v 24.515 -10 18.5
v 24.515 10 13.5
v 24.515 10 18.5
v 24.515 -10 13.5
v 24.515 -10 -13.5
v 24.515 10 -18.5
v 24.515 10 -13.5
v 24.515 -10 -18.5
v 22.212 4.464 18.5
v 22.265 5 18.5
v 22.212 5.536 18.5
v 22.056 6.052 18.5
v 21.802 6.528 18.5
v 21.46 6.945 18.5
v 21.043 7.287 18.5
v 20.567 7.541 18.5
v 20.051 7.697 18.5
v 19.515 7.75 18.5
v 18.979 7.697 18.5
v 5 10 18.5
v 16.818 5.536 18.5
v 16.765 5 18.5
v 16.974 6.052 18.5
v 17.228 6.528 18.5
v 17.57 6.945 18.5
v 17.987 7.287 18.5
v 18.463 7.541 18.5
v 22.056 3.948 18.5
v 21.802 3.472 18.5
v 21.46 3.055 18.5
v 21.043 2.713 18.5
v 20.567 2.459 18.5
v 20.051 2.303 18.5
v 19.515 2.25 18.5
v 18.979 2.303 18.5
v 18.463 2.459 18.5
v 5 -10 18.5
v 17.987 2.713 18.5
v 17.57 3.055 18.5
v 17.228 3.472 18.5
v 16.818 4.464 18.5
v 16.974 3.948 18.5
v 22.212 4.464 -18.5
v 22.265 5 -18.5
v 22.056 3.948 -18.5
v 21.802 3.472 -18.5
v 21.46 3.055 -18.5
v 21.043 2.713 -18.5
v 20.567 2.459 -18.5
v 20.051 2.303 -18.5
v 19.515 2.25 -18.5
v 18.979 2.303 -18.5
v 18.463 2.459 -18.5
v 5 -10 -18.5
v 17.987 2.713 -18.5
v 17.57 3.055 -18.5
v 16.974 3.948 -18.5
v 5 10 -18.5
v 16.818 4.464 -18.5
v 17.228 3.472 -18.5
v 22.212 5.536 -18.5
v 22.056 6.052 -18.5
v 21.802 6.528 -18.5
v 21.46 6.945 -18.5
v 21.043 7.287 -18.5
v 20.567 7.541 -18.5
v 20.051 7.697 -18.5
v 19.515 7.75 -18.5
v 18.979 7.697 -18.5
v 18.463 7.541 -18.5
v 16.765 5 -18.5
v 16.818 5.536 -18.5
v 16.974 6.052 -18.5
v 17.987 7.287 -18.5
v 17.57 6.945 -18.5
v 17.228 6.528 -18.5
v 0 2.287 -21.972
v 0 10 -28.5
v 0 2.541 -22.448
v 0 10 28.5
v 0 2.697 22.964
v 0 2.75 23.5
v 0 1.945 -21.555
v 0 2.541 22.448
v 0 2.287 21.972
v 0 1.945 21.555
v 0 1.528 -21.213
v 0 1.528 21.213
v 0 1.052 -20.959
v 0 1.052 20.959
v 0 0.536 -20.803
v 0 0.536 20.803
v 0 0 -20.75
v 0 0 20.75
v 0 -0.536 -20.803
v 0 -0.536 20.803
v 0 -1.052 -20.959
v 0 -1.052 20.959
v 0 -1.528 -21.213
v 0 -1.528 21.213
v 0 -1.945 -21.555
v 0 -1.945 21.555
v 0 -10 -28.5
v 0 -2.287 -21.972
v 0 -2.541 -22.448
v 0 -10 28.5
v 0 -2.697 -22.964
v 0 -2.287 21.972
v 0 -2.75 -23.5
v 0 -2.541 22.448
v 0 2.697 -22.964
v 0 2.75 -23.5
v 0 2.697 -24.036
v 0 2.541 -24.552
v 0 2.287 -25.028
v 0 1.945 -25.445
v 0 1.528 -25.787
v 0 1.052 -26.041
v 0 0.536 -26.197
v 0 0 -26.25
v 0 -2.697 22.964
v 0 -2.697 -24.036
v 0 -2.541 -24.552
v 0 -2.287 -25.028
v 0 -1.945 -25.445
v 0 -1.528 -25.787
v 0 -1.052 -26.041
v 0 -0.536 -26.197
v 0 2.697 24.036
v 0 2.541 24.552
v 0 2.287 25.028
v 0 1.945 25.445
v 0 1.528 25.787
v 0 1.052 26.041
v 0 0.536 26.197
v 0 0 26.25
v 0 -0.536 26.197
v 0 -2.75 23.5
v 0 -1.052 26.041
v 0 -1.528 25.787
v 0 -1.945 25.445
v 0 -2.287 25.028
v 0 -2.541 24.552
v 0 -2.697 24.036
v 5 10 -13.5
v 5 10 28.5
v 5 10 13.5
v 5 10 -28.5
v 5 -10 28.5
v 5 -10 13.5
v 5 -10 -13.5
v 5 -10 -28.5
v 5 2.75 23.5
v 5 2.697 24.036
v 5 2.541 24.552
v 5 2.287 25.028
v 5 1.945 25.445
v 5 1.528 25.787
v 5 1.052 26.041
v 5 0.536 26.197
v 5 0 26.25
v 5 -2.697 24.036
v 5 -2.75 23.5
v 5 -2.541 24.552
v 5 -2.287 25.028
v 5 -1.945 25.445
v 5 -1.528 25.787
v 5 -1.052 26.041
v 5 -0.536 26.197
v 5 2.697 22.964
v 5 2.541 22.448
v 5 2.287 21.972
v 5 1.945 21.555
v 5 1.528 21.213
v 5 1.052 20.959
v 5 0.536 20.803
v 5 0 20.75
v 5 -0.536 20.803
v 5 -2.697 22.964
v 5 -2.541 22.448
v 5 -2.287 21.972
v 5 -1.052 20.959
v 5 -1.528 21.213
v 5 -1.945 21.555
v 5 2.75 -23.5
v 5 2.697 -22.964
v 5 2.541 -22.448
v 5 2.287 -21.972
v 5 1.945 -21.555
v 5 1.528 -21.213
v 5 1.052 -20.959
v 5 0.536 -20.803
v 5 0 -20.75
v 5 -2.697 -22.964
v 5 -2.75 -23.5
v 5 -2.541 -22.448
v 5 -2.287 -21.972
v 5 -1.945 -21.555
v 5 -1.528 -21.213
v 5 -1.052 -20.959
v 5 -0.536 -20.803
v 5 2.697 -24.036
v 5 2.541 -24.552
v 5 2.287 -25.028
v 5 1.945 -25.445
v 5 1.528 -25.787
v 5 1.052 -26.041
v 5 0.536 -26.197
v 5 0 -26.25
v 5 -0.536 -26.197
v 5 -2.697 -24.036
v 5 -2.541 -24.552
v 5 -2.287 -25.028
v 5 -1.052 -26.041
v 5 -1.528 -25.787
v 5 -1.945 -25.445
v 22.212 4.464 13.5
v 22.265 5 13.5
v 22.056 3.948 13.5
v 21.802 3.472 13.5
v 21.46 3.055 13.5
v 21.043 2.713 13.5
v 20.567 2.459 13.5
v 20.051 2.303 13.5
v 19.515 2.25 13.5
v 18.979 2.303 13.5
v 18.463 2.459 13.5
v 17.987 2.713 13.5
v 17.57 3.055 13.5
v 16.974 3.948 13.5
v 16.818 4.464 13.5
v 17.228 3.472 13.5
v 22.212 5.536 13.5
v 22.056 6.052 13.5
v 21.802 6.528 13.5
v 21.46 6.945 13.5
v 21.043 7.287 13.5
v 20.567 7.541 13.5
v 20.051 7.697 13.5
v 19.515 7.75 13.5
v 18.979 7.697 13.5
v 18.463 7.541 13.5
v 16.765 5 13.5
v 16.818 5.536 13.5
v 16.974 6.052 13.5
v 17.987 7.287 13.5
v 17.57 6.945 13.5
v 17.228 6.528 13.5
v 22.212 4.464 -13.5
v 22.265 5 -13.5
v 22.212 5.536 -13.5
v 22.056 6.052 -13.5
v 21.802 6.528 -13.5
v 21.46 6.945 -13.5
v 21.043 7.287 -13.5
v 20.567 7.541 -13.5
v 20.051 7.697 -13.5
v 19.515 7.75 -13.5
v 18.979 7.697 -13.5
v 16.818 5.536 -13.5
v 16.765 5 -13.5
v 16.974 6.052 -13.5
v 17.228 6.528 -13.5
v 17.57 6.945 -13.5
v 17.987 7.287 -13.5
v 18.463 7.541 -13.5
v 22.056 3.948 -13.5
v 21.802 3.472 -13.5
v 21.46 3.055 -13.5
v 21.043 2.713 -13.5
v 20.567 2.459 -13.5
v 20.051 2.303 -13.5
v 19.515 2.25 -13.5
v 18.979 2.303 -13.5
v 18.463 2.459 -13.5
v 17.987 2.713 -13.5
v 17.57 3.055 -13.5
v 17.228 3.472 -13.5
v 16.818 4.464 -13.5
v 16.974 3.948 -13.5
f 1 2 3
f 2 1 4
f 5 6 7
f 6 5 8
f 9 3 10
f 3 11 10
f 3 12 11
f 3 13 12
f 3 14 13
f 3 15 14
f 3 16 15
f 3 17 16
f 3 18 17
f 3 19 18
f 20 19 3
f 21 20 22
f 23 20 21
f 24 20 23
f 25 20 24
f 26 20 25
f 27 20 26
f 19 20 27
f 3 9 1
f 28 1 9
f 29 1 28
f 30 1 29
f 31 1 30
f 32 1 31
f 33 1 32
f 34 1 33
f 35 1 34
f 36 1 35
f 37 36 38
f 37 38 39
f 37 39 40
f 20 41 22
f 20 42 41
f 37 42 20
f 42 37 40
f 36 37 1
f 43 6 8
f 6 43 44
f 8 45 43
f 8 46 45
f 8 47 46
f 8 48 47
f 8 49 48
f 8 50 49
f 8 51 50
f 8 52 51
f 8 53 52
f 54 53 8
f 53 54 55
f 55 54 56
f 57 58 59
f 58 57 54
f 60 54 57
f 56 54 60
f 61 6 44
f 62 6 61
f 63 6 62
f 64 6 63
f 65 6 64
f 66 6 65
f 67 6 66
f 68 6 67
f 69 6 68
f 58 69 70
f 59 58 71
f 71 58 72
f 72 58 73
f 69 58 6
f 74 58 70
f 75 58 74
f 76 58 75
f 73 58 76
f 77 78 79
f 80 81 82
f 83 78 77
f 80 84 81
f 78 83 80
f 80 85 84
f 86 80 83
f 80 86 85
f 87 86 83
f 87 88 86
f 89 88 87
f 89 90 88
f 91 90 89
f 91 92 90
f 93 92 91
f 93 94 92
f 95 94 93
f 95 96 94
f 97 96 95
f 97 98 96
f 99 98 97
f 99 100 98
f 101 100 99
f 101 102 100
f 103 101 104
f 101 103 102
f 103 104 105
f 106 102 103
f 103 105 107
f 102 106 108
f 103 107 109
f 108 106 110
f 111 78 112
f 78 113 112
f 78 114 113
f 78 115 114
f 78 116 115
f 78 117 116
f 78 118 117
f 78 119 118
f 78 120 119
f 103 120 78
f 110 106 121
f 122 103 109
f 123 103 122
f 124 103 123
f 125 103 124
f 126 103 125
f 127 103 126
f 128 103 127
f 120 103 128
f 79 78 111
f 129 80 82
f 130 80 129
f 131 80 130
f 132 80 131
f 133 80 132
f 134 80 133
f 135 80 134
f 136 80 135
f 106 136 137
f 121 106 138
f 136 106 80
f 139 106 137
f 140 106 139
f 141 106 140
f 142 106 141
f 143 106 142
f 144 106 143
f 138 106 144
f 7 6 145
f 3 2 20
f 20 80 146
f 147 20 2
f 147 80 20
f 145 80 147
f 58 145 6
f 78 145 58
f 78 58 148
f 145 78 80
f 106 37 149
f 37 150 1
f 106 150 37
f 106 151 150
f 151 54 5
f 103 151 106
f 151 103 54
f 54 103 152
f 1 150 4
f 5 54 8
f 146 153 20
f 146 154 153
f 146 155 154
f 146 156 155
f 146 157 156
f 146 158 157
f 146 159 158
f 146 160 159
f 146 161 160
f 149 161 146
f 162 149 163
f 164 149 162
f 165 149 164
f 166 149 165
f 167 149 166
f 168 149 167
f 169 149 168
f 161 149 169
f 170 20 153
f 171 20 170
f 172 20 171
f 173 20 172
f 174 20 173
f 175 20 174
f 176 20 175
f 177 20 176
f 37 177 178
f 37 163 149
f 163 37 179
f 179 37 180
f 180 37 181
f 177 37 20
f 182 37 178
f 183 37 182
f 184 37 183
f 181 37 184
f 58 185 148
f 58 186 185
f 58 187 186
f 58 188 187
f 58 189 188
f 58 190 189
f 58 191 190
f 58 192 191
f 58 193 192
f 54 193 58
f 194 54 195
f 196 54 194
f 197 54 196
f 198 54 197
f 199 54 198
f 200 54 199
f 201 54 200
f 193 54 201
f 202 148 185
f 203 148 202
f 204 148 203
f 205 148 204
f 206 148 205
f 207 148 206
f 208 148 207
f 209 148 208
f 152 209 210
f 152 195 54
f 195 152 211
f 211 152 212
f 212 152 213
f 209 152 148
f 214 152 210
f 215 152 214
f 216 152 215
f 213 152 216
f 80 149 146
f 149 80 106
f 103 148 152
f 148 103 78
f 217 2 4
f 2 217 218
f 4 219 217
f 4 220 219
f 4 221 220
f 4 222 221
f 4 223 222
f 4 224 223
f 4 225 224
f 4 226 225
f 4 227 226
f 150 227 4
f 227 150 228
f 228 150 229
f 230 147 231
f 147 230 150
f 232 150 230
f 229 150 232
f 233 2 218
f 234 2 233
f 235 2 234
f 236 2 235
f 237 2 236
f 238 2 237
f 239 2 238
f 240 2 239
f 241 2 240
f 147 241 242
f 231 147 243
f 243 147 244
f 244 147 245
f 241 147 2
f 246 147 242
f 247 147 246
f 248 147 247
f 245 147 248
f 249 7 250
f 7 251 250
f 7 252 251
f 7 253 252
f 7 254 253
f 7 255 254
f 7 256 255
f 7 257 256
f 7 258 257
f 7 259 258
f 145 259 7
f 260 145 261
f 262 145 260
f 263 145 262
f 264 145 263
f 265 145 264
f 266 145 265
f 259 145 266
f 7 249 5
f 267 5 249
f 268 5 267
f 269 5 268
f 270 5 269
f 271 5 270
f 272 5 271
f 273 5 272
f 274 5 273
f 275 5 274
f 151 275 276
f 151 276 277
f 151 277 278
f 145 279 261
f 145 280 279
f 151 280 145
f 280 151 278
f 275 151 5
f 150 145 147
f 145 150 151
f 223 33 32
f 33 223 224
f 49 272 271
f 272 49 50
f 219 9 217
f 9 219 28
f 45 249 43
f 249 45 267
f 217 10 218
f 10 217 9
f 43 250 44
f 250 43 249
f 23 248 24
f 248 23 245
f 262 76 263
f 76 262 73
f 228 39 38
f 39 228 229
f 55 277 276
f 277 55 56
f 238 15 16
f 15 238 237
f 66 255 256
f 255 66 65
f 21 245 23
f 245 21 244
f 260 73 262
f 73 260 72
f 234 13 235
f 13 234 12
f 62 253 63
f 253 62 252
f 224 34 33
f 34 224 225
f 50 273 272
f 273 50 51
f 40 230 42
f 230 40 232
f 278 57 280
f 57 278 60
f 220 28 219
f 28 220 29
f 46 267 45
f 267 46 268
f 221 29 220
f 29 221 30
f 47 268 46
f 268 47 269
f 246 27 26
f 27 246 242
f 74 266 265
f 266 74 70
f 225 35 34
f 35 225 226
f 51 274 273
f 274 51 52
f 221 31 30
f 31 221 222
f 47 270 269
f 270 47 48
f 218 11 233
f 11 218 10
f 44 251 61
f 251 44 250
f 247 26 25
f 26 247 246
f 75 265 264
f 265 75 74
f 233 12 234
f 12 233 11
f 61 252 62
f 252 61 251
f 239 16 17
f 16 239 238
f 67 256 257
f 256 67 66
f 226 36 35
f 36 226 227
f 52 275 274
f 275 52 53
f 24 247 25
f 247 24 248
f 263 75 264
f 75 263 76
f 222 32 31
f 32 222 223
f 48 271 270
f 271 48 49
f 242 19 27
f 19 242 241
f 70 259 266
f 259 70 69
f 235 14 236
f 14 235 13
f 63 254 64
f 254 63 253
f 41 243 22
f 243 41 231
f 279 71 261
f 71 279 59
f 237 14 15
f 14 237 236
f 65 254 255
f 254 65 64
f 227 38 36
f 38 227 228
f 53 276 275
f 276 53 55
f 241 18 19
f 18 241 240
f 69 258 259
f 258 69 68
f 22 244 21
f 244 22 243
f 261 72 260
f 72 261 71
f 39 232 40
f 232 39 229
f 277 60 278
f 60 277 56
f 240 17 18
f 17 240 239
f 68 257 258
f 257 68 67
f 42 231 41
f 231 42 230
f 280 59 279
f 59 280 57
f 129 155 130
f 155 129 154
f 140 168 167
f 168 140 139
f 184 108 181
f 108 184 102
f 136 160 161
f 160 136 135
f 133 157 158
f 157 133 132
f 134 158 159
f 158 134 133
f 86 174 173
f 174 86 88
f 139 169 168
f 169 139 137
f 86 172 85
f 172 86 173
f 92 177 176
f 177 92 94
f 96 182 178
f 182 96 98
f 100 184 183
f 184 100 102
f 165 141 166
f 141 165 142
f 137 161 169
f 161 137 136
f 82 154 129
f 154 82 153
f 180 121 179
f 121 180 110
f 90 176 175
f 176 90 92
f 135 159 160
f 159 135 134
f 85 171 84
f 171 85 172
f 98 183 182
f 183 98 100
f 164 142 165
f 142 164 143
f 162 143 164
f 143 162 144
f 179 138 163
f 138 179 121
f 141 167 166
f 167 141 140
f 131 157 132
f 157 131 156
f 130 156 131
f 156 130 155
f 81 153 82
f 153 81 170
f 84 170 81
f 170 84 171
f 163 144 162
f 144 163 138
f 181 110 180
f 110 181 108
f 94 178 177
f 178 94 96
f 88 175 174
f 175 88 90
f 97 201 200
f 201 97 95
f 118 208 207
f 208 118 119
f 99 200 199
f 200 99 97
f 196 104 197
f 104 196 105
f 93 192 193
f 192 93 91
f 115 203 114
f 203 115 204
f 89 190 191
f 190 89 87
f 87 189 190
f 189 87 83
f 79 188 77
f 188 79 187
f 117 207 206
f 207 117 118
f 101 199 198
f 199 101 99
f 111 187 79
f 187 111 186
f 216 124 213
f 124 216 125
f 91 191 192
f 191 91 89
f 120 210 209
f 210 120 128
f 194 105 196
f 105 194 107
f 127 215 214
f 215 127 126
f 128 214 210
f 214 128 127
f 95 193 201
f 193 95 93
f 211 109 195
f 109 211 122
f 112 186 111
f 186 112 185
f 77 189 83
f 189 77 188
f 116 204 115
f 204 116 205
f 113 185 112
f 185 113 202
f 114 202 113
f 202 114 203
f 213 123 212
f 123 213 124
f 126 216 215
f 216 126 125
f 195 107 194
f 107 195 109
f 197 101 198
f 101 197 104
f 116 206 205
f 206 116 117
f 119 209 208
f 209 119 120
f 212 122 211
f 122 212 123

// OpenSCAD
// file: ../library.scad
module lm8uu (shaft_length=100) {
  d = 15.5;
  l = 24+1;
  cylinder(d=8+4, h=shaft_length, center=true);
  cylinder(d=d, h=l, center=true);
}

module lm8uu_zip_tie (thickness, width) {
  d = 15.5;
  cylinder(d=15.5+thickness*2, h=width, center=true);
  translate([0,0+(d+thickness)/2,0]) cube([100,thickness,width], center=true);
  translate([0,0-(d+thickness)/2,0]) cube([100,thickness,width], center=true);
}

module m3_mounting_hole(use_insert_nuts=false) {
  if (!use_insert_nuts) {
    translate([0, 0, 0]) rotate([90,0,0]) cylinder(d=3+0.5, h=8);
    slot_width = 5.5+0.6;
    slot_depth = 2.4+0.6;
    translate([0, -2-(slot_depth)/2, 0]) cube([slot_width,slot_depth,100], center=true);
  } else {
    translate([0, 0 + 2.5 - 5, 0]) rotate([90,0,0]) cylinder(d=4, h=5, center=true);
  }
}

function screw_head_diameter(screw_diameter) = lookup(screw_diameter, [
   [1.4, 2.6],
   [1.6, 3],
   [2.0, 3.8],
   [2.5, 4.5],
   [3.0, 5.5],
   [4.0, 7],
   [5.0, 8.5],
   [6.0, 10],
   [8.0, 13],
   [ 10, 16],
   [ 12, 18],
   [ 14, 21],
   [ 16, 24],
   [ 18, 27],
   [ 20, 30]
 ]);

// scale allows for better fit of screw in hole
// seperation avoids overhands when printing screw hole with head at bottom
module screw (d, l, head=true, scale=1.1, separation=0) { 
  half_scale = (1+(scale-1)/2);
  cylinder(h=l, d=d*scale, center=false);
  if (head) {translate([0,0,-d*half_scale]) cylinder(
    d=screw_head_diameter(d)*scale,
    h=d*scale-separation
  );}
}

module GT2_tooth(h) {
  extra_width = 0.5;
  translate([-1,-0.5-extra_width,0]) cube([2,0.5+extra_width,h]);
  linear_extrude(height=h) polygon([[0.747183,-0.5],[0.747183,0],[0.647876,0.037218],[0.598311,0.130528],[0.578556,0.238423],[0.547158,0.343077],[0.504649,0.443762],[0.451556,0.53975],[0.358229,0.636924],[0.2484,0.707276],[0.127259,0.750044],[0,0.76447],[-0.127259,0.750044],[-0.2484,0.707276],[-0.358229,0.636924],[-0.451556,0.53975],[-0.504797,0.443762],[-0.547291,0.343077],[-0.578605,0.238423],[-0.598311,0.130528],[-0.648009,0.037218],[-0.747183,0],[-0.747183,-0.5]]);
}

module nema17(height, screw_mask_height=0, screw_mask_slot_length=0, center_mask_height=2.5) {
  difference() {
    translate([0,0,-height/2]) hull() {
      cube([42.3, 31, height], center=true);
      cube([31, 42.3, height], center=true);
    }
    translate([31/2,31/2,-4.5]) cylinder(h=9,d=3);
    translate([31/2,-31/2,-4.5]) cylinder(h=9,d=3);
    translate([-31/2,31/2,-4.5]) cylinder(h=9,d=3);
    translate([-31/2,-31/2,-4.5]) cylinder(h=9,d=3);
  }
  cylinder(h=center_mask_height, d=22+2);
  cylinder(h=27, d=5+2);
    
  screw_slot( 31/2, 31/2);
  screw_slot( 31/2,-31/2);
  screw_slot(-31/2, 31/2);
  screw_slot(-31/2,-31/2);
  
  module screw_slot(x, y) { hull() {
    dx = x > 0 ? screw_mask_slot_length/2 : -screw_mask_slot_length/2;
    dy = y > 0 ? screw_mask_slot_length/2 : -screw_mask_slot_length/2;
    translate([x+dx,y+dy,screw_mask_height]) rotate([180,0,0]) screw(d=3, l=screw_mask_height, d=3, head=false);
    translate([x-dx,y-dy,screw_mask_height]) rotate([180,0,0]) screw(d=3, l=screw_mask_height, d=3, head=false);
  }}
}
// main file
$fn=32;
use <../library.scad>;

nema17_width = 42.3;
GT2_pulley_diameter = 12.73;
ALU_width = 20;
GT2_thickness = 2;
crowned_pulley_diameter = 20;

screw_x = nema17_width/2 + GT2_pulley_diameter/2 - ALU_width + GT2_thickness + crowned_pulley_diameter/2;
size_x = screw_x + 5;
screw_y = ALU_width - 5;

inner_height = 30-1.5*2;

difference() {
  union() {
    translate([size_x/2,0,0]) cube([size_x,ALU_width,inner_height+10], center=true);
    translate([5/2,0,0]) cube([5,20,inner_height+10+20], center=true);
  }
  translate([100/2+5,0,0]) cube([100,100,inner_height], center=true);
  translate([screw_x,screw_y-ALU_width/2,inner_height/2+5]) rotate([180,0,0]) screw(d=5, l=41, head=false);

  translate([10,0, (inner_height+10+10)/2]) rotate([0,-90,0]) screw(d=5, l=10, head=false);
  translate([10,0,-(inner_height+10+10)/2]) rotate([0,-90,0]) screw(d=5, l=10, head=false);
}
